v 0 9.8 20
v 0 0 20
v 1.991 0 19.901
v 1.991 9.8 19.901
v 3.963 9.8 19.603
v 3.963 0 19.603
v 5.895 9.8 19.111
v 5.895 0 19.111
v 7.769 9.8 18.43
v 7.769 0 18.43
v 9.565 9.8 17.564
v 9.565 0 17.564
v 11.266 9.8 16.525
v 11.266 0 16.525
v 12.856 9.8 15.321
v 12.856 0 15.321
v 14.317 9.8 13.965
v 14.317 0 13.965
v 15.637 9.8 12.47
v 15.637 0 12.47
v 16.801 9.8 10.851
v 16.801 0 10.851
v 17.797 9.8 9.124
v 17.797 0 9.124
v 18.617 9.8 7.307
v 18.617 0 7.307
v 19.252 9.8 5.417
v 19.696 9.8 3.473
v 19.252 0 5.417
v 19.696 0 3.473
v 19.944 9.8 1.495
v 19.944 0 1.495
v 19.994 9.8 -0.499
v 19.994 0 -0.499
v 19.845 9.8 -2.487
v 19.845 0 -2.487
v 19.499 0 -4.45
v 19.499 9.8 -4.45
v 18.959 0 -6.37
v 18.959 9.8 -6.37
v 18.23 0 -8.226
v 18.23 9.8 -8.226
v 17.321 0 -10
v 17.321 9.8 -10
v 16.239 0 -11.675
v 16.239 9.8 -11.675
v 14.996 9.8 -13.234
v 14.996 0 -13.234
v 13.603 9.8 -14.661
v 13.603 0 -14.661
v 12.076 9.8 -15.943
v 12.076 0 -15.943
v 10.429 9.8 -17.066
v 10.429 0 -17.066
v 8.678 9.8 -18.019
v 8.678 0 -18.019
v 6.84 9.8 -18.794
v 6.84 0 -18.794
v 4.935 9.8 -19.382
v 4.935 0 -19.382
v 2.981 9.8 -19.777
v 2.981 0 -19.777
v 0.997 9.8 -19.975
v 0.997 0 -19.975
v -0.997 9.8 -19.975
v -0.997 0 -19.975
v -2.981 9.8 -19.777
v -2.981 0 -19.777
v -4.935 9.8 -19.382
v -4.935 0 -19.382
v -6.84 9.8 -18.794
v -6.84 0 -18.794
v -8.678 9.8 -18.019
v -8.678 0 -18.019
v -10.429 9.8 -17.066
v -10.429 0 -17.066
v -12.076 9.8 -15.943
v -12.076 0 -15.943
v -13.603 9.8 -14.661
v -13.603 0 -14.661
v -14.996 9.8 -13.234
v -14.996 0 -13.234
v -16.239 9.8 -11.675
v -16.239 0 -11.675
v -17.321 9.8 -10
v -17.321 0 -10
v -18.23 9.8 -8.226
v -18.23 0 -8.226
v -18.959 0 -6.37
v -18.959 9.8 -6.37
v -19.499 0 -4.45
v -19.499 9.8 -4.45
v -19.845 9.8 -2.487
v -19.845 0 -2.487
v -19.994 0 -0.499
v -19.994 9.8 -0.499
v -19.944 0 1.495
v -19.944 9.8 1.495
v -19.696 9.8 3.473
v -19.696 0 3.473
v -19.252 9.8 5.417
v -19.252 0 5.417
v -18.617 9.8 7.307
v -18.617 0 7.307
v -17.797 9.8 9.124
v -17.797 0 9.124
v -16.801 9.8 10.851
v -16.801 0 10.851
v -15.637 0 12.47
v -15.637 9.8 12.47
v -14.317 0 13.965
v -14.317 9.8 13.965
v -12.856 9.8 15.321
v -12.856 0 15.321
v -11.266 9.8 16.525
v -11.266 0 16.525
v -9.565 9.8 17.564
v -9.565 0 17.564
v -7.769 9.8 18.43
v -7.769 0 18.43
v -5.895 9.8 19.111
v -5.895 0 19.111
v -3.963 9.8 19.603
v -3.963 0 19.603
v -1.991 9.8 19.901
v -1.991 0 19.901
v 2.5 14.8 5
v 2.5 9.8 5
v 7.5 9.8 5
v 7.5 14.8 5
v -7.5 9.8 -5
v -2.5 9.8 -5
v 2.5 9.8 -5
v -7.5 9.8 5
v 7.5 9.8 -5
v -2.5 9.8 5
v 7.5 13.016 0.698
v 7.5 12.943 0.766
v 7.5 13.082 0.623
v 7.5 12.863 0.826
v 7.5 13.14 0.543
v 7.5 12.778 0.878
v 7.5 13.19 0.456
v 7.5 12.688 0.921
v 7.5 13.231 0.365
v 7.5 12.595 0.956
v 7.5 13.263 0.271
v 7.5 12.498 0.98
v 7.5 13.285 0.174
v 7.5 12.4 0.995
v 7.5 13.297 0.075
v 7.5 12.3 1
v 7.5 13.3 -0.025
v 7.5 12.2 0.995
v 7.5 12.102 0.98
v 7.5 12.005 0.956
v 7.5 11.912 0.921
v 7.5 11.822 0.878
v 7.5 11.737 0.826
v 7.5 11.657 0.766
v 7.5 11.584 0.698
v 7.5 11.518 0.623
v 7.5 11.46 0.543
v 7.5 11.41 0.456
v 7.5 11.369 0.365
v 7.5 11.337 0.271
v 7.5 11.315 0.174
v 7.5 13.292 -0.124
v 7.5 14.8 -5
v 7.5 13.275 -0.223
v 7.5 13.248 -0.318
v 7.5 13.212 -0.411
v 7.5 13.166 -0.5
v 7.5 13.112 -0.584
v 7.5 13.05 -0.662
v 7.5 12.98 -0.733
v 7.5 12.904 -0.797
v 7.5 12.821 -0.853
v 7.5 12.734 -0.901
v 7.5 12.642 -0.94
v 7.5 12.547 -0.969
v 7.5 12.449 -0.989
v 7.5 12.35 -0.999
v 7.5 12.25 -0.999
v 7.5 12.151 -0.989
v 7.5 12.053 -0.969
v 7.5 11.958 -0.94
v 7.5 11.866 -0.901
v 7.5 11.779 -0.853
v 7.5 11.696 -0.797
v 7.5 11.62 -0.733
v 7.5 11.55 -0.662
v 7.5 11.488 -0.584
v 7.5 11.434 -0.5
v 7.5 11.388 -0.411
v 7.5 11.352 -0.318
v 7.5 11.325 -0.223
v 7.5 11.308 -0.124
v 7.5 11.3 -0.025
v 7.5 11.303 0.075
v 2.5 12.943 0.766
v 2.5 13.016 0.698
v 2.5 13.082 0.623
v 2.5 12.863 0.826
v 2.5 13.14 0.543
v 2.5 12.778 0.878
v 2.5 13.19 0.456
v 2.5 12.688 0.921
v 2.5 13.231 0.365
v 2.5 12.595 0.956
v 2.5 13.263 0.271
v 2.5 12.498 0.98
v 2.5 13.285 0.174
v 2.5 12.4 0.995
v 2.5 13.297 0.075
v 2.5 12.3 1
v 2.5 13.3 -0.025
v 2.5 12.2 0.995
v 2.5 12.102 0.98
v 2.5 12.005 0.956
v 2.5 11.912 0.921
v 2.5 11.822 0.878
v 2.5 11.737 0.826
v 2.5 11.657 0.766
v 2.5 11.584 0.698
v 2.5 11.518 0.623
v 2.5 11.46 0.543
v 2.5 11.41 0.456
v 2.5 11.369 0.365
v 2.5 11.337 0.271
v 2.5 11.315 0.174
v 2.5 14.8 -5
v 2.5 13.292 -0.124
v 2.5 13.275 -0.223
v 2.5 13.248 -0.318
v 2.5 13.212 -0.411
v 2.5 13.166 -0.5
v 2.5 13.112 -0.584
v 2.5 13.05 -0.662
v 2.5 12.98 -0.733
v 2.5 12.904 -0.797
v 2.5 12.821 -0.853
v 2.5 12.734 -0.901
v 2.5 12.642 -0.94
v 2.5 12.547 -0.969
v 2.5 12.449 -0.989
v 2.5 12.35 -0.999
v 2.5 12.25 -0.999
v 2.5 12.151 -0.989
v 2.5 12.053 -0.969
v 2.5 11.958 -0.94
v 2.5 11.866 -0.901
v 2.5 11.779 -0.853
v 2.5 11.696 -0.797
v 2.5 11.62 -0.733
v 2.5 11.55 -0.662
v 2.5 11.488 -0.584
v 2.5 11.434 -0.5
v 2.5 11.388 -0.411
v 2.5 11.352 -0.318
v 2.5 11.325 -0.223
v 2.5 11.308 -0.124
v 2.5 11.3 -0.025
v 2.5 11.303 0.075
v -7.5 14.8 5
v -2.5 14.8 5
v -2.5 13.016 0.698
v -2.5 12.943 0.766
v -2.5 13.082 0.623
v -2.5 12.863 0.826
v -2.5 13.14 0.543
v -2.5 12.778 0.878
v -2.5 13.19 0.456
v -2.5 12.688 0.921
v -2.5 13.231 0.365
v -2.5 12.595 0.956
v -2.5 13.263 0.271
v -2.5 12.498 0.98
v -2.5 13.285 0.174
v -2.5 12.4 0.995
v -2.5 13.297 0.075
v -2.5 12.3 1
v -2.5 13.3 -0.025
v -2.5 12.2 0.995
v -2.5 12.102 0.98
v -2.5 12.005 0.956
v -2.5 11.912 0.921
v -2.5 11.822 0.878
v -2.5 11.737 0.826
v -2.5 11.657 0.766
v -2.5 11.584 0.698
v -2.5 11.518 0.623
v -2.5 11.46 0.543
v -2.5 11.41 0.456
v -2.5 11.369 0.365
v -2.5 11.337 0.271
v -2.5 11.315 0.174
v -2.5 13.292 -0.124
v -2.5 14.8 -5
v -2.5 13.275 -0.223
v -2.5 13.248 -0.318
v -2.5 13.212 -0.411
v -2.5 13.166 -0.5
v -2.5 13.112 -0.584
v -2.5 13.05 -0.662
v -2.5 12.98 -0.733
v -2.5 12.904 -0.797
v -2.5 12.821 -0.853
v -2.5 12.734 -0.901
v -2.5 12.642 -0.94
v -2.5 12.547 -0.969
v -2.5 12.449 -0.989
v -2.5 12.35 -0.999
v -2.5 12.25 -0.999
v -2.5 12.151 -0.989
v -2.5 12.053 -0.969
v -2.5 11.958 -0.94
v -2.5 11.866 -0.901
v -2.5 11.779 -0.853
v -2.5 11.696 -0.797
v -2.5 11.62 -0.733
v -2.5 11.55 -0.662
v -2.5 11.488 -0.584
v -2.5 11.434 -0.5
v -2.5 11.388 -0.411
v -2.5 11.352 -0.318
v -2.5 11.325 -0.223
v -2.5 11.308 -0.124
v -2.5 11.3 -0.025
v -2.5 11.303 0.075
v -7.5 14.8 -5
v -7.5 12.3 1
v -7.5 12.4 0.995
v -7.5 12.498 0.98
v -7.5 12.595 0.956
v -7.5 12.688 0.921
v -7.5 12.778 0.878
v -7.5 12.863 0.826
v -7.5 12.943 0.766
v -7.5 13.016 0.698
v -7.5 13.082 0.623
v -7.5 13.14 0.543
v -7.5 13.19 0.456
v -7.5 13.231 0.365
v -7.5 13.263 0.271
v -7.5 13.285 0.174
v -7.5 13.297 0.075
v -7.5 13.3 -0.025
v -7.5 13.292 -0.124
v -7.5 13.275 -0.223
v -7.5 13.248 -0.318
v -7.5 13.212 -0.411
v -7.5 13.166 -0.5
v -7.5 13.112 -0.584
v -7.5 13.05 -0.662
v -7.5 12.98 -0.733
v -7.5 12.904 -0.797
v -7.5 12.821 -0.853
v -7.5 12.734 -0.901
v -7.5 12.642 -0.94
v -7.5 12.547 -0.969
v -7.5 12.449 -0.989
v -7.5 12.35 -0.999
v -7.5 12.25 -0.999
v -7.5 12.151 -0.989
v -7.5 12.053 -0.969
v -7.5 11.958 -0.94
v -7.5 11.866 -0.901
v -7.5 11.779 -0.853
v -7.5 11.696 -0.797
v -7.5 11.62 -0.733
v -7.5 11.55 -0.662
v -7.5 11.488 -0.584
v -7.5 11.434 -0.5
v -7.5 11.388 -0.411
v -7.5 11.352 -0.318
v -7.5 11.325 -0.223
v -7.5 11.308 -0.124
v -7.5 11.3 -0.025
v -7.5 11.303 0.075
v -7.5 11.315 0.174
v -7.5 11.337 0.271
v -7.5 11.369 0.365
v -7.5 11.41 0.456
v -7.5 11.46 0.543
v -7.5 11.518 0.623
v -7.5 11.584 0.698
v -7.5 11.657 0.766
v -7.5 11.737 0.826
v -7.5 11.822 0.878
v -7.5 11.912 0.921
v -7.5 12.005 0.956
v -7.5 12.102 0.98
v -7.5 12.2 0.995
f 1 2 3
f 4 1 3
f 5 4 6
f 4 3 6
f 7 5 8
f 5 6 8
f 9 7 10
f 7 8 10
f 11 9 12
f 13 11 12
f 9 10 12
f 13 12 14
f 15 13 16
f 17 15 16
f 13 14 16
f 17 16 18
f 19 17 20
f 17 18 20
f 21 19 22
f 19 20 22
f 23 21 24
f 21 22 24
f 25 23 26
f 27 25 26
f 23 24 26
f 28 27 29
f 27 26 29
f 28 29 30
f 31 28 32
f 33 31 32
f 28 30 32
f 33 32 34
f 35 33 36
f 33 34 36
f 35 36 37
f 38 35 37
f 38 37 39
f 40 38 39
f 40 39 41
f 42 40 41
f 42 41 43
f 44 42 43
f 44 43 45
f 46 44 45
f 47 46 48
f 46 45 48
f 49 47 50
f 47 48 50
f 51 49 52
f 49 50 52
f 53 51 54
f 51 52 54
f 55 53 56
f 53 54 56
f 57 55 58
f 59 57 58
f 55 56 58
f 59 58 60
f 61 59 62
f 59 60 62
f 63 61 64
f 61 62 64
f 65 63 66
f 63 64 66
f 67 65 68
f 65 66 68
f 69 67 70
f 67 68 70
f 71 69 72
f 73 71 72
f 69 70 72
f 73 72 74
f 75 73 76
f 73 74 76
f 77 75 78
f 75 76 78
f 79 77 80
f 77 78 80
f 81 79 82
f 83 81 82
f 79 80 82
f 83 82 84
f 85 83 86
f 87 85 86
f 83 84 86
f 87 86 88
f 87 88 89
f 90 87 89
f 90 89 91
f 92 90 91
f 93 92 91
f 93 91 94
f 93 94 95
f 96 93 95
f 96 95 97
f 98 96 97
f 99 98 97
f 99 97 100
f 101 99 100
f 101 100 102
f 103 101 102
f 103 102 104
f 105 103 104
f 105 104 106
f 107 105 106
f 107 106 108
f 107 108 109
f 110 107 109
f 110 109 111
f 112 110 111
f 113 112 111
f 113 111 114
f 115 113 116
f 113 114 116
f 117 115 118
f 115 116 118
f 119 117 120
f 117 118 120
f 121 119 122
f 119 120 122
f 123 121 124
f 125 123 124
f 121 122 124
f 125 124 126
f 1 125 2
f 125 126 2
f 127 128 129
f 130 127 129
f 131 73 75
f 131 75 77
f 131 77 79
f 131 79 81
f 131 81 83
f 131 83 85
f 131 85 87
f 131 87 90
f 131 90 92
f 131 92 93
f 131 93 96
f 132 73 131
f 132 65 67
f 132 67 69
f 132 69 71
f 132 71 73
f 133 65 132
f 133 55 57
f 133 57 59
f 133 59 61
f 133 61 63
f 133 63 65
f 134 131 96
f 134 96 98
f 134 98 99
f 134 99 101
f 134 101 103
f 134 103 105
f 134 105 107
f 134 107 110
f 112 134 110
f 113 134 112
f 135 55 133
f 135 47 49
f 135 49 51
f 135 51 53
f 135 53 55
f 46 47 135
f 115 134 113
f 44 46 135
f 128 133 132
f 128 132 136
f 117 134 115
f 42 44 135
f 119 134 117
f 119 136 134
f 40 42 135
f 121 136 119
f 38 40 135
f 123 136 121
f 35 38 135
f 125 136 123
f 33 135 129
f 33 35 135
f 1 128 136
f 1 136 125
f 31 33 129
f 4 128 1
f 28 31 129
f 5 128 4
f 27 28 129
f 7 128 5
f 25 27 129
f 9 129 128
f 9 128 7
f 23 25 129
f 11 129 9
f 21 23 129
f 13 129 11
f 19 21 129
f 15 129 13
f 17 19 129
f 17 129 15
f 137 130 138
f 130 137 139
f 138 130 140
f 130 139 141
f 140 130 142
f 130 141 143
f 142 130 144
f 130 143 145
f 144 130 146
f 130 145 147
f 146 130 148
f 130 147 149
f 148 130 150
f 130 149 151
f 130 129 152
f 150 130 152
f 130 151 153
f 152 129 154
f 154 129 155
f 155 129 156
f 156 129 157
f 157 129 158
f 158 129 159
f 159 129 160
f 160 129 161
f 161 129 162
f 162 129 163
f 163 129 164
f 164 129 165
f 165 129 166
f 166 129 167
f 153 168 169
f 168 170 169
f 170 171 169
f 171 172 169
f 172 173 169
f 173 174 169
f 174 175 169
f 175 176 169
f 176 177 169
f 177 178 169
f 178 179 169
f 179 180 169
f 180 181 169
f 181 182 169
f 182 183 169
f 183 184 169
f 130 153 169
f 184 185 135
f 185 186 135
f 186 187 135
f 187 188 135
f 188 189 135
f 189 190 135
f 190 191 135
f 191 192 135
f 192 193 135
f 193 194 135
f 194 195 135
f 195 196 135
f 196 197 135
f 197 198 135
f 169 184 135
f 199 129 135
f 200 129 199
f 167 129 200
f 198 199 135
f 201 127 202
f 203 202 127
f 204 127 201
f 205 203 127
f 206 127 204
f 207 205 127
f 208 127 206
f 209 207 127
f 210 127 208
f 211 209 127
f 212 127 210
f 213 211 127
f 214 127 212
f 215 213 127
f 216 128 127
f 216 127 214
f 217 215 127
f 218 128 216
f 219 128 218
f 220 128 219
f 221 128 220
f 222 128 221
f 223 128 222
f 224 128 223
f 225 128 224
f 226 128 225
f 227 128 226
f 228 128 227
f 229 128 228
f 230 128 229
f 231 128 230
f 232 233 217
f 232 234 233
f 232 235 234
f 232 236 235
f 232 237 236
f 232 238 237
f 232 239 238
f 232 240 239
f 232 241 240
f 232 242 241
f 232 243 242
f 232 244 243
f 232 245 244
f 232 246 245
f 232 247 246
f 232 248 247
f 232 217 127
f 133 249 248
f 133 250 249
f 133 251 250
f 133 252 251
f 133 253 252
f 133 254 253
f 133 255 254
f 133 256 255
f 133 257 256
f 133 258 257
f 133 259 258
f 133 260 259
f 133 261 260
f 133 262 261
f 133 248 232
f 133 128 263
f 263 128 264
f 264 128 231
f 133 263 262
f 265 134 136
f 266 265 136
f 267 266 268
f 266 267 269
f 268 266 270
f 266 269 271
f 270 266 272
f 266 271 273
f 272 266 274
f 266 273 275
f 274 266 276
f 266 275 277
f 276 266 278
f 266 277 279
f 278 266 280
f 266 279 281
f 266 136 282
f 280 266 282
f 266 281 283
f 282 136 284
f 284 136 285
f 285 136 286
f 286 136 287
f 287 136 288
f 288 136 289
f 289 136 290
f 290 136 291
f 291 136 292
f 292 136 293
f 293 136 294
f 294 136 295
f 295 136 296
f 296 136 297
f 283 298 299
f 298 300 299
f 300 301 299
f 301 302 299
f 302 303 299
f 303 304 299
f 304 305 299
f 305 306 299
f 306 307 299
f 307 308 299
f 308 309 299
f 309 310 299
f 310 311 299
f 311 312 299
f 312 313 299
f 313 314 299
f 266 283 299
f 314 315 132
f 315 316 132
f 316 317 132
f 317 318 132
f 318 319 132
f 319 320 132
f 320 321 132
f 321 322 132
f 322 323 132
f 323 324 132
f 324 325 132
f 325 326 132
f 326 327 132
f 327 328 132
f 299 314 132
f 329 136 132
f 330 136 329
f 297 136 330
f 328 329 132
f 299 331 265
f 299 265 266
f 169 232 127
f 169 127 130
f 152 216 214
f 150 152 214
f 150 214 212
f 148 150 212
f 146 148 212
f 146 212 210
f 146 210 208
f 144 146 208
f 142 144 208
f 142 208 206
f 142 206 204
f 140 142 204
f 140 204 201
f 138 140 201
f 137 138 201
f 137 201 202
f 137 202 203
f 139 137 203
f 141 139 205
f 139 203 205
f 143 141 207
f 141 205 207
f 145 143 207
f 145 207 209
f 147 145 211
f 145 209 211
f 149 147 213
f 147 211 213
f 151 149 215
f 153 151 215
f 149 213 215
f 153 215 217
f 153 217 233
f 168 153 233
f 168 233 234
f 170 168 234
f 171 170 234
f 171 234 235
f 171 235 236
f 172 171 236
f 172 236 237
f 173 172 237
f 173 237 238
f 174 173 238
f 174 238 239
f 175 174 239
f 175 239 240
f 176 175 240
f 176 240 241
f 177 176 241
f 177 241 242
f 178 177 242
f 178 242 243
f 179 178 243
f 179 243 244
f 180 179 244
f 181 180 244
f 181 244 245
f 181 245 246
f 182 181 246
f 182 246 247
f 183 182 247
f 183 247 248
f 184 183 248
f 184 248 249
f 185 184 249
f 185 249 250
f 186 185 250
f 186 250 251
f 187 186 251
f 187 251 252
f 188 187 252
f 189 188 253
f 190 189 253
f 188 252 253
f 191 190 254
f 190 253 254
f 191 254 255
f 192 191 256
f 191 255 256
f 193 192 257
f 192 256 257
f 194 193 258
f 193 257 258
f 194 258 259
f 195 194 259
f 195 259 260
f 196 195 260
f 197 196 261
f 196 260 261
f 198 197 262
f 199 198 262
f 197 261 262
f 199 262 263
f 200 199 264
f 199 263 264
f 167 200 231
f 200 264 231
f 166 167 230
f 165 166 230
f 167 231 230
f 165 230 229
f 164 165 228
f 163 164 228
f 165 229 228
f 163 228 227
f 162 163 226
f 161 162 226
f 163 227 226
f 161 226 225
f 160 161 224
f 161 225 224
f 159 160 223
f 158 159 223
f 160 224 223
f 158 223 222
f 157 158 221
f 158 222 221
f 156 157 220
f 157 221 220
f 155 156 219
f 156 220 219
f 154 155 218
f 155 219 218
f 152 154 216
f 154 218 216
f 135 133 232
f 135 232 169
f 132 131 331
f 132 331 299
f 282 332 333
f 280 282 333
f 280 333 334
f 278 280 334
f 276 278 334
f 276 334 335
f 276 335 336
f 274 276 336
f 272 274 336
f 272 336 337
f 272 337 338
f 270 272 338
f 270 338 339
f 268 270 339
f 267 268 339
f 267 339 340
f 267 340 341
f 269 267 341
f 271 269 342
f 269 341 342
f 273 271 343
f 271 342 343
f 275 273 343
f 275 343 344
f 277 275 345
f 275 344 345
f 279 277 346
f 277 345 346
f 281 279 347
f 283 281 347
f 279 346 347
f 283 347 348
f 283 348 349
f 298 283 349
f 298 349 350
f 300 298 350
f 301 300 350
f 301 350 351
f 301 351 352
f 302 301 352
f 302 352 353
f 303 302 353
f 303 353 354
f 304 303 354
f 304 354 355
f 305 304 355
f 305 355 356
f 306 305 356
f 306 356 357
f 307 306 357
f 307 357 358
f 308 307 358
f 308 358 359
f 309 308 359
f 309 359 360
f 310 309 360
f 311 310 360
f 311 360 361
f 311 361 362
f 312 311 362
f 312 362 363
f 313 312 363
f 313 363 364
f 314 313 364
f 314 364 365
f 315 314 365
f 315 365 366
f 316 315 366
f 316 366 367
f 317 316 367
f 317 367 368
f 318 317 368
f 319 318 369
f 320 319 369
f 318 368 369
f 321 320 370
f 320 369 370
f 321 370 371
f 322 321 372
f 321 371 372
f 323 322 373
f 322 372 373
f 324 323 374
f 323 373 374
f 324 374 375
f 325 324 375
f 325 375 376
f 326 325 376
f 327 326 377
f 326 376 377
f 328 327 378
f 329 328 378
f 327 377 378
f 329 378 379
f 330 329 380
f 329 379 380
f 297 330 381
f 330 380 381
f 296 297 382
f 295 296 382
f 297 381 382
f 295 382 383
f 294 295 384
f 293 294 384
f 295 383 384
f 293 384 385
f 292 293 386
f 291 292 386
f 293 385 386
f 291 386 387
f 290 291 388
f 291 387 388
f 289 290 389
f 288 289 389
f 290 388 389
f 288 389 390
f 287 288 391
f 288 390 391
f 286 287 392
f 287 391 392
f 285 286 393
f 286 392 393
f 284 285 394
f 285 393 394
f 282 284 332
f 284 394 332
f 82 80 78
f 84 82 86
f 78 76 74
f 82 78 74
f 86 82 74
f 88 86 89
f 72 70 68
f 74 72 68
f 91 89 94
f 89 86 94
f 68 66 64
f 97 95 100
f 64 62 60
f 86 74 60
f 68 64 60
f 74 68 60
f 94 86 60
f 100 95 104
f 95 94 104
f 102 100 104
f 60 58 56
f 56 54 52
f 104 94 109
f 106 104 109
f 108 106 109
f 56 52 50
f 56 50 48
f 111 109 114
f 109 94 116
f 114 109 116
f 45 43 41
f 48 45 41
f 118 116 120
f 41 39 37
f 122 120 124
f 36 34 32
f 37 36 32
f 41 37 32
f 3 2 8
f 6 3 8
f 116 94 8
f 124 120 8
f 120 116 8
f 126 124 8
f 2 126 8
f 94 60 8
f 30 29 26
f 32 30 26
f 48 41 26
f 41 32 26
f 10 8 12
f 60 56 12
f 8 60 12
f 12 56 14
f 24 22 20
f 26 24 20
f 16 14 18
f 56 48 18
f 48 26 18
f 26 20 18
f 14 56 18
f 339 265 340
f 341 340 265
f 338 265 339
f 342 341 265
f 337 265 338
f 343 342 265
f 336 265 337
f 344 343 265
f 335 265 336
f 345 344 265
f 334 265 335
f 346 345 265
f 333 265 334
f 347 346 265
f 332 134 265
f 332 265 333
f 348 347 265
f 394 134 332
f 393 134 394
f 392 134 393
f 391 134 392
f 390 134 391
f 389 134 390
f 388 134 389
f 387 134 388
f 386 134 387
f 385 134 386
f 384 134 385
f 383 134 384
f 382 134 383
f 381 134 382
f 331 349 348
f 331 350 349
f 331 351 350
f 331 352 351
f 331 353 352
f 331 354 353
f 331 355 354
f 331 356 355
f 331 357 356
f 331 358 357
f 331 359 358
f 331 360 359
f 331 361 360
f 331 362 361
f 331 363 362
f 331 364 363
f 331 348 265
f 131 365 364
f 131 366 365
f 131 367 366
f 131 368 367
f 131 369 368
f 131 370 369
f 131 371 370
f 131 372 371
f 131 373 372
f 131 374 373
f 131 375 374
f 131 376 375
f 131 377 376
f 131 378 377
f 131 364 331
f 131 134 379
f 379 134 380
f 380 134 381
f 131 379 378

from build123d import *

# Parameters (mm, degrees)
CROQUIS2_R              = 20
SALIENTE_EXTRUIR1_DEPTH = 9.8
CROQUIS3_W              = 5
CROQUIS3_H              = 10
SALIENTE_EXTRUIR2_DEPTH = 5
CROQUIS4_R              = 1
CORTAR_EXTRUIR1_DEPTH   = 38.084902589


with BuildPart() as part:
    # Croquis2 → Saliente-Extruir1 (new body)
    with BuildSketch(Plane(origin=(0, 0, 0), x_dir=(1, 0, 0), z_dir=(0, 1, 0))):
        with Locations(Location((0, 0, 0), (0, 0, 270))):
            Circle(CROQUIS2_R)
    extrude(amount=SALIENTE_EXTRUIR1_DEPTH)

    # Croquis3 → Saliente-Extruir2 (add)
    with BuildSketch(Plane(origin=(0, 9.8, 0), x_dir=(1, 0, 0), z_dir=(0, 1, 0))):
        with Locations((5, 0)):
            Rectangle(CROQUIS3_W, CROQUIS3_H)
        with Locations((-5, 0)):
            Rectangle(CROQUIS3_W, CROQUIS3_H)
    extrude(amount=SALIENTE_EXTRUIR2_DEPTH)

    # Croquis4 → Cortar-Extruir1 (cut, through all)
    with BuildSketch(Plane.ZY.offset(7.5)):
        with Locations((0, 12.3)):
            Circle(CROQUIS4_R)
    extrude(amount=-CORTAR_EXTRUIR1_DEPTH, mode=Mode.SUBTRACT)


solid = part.part
